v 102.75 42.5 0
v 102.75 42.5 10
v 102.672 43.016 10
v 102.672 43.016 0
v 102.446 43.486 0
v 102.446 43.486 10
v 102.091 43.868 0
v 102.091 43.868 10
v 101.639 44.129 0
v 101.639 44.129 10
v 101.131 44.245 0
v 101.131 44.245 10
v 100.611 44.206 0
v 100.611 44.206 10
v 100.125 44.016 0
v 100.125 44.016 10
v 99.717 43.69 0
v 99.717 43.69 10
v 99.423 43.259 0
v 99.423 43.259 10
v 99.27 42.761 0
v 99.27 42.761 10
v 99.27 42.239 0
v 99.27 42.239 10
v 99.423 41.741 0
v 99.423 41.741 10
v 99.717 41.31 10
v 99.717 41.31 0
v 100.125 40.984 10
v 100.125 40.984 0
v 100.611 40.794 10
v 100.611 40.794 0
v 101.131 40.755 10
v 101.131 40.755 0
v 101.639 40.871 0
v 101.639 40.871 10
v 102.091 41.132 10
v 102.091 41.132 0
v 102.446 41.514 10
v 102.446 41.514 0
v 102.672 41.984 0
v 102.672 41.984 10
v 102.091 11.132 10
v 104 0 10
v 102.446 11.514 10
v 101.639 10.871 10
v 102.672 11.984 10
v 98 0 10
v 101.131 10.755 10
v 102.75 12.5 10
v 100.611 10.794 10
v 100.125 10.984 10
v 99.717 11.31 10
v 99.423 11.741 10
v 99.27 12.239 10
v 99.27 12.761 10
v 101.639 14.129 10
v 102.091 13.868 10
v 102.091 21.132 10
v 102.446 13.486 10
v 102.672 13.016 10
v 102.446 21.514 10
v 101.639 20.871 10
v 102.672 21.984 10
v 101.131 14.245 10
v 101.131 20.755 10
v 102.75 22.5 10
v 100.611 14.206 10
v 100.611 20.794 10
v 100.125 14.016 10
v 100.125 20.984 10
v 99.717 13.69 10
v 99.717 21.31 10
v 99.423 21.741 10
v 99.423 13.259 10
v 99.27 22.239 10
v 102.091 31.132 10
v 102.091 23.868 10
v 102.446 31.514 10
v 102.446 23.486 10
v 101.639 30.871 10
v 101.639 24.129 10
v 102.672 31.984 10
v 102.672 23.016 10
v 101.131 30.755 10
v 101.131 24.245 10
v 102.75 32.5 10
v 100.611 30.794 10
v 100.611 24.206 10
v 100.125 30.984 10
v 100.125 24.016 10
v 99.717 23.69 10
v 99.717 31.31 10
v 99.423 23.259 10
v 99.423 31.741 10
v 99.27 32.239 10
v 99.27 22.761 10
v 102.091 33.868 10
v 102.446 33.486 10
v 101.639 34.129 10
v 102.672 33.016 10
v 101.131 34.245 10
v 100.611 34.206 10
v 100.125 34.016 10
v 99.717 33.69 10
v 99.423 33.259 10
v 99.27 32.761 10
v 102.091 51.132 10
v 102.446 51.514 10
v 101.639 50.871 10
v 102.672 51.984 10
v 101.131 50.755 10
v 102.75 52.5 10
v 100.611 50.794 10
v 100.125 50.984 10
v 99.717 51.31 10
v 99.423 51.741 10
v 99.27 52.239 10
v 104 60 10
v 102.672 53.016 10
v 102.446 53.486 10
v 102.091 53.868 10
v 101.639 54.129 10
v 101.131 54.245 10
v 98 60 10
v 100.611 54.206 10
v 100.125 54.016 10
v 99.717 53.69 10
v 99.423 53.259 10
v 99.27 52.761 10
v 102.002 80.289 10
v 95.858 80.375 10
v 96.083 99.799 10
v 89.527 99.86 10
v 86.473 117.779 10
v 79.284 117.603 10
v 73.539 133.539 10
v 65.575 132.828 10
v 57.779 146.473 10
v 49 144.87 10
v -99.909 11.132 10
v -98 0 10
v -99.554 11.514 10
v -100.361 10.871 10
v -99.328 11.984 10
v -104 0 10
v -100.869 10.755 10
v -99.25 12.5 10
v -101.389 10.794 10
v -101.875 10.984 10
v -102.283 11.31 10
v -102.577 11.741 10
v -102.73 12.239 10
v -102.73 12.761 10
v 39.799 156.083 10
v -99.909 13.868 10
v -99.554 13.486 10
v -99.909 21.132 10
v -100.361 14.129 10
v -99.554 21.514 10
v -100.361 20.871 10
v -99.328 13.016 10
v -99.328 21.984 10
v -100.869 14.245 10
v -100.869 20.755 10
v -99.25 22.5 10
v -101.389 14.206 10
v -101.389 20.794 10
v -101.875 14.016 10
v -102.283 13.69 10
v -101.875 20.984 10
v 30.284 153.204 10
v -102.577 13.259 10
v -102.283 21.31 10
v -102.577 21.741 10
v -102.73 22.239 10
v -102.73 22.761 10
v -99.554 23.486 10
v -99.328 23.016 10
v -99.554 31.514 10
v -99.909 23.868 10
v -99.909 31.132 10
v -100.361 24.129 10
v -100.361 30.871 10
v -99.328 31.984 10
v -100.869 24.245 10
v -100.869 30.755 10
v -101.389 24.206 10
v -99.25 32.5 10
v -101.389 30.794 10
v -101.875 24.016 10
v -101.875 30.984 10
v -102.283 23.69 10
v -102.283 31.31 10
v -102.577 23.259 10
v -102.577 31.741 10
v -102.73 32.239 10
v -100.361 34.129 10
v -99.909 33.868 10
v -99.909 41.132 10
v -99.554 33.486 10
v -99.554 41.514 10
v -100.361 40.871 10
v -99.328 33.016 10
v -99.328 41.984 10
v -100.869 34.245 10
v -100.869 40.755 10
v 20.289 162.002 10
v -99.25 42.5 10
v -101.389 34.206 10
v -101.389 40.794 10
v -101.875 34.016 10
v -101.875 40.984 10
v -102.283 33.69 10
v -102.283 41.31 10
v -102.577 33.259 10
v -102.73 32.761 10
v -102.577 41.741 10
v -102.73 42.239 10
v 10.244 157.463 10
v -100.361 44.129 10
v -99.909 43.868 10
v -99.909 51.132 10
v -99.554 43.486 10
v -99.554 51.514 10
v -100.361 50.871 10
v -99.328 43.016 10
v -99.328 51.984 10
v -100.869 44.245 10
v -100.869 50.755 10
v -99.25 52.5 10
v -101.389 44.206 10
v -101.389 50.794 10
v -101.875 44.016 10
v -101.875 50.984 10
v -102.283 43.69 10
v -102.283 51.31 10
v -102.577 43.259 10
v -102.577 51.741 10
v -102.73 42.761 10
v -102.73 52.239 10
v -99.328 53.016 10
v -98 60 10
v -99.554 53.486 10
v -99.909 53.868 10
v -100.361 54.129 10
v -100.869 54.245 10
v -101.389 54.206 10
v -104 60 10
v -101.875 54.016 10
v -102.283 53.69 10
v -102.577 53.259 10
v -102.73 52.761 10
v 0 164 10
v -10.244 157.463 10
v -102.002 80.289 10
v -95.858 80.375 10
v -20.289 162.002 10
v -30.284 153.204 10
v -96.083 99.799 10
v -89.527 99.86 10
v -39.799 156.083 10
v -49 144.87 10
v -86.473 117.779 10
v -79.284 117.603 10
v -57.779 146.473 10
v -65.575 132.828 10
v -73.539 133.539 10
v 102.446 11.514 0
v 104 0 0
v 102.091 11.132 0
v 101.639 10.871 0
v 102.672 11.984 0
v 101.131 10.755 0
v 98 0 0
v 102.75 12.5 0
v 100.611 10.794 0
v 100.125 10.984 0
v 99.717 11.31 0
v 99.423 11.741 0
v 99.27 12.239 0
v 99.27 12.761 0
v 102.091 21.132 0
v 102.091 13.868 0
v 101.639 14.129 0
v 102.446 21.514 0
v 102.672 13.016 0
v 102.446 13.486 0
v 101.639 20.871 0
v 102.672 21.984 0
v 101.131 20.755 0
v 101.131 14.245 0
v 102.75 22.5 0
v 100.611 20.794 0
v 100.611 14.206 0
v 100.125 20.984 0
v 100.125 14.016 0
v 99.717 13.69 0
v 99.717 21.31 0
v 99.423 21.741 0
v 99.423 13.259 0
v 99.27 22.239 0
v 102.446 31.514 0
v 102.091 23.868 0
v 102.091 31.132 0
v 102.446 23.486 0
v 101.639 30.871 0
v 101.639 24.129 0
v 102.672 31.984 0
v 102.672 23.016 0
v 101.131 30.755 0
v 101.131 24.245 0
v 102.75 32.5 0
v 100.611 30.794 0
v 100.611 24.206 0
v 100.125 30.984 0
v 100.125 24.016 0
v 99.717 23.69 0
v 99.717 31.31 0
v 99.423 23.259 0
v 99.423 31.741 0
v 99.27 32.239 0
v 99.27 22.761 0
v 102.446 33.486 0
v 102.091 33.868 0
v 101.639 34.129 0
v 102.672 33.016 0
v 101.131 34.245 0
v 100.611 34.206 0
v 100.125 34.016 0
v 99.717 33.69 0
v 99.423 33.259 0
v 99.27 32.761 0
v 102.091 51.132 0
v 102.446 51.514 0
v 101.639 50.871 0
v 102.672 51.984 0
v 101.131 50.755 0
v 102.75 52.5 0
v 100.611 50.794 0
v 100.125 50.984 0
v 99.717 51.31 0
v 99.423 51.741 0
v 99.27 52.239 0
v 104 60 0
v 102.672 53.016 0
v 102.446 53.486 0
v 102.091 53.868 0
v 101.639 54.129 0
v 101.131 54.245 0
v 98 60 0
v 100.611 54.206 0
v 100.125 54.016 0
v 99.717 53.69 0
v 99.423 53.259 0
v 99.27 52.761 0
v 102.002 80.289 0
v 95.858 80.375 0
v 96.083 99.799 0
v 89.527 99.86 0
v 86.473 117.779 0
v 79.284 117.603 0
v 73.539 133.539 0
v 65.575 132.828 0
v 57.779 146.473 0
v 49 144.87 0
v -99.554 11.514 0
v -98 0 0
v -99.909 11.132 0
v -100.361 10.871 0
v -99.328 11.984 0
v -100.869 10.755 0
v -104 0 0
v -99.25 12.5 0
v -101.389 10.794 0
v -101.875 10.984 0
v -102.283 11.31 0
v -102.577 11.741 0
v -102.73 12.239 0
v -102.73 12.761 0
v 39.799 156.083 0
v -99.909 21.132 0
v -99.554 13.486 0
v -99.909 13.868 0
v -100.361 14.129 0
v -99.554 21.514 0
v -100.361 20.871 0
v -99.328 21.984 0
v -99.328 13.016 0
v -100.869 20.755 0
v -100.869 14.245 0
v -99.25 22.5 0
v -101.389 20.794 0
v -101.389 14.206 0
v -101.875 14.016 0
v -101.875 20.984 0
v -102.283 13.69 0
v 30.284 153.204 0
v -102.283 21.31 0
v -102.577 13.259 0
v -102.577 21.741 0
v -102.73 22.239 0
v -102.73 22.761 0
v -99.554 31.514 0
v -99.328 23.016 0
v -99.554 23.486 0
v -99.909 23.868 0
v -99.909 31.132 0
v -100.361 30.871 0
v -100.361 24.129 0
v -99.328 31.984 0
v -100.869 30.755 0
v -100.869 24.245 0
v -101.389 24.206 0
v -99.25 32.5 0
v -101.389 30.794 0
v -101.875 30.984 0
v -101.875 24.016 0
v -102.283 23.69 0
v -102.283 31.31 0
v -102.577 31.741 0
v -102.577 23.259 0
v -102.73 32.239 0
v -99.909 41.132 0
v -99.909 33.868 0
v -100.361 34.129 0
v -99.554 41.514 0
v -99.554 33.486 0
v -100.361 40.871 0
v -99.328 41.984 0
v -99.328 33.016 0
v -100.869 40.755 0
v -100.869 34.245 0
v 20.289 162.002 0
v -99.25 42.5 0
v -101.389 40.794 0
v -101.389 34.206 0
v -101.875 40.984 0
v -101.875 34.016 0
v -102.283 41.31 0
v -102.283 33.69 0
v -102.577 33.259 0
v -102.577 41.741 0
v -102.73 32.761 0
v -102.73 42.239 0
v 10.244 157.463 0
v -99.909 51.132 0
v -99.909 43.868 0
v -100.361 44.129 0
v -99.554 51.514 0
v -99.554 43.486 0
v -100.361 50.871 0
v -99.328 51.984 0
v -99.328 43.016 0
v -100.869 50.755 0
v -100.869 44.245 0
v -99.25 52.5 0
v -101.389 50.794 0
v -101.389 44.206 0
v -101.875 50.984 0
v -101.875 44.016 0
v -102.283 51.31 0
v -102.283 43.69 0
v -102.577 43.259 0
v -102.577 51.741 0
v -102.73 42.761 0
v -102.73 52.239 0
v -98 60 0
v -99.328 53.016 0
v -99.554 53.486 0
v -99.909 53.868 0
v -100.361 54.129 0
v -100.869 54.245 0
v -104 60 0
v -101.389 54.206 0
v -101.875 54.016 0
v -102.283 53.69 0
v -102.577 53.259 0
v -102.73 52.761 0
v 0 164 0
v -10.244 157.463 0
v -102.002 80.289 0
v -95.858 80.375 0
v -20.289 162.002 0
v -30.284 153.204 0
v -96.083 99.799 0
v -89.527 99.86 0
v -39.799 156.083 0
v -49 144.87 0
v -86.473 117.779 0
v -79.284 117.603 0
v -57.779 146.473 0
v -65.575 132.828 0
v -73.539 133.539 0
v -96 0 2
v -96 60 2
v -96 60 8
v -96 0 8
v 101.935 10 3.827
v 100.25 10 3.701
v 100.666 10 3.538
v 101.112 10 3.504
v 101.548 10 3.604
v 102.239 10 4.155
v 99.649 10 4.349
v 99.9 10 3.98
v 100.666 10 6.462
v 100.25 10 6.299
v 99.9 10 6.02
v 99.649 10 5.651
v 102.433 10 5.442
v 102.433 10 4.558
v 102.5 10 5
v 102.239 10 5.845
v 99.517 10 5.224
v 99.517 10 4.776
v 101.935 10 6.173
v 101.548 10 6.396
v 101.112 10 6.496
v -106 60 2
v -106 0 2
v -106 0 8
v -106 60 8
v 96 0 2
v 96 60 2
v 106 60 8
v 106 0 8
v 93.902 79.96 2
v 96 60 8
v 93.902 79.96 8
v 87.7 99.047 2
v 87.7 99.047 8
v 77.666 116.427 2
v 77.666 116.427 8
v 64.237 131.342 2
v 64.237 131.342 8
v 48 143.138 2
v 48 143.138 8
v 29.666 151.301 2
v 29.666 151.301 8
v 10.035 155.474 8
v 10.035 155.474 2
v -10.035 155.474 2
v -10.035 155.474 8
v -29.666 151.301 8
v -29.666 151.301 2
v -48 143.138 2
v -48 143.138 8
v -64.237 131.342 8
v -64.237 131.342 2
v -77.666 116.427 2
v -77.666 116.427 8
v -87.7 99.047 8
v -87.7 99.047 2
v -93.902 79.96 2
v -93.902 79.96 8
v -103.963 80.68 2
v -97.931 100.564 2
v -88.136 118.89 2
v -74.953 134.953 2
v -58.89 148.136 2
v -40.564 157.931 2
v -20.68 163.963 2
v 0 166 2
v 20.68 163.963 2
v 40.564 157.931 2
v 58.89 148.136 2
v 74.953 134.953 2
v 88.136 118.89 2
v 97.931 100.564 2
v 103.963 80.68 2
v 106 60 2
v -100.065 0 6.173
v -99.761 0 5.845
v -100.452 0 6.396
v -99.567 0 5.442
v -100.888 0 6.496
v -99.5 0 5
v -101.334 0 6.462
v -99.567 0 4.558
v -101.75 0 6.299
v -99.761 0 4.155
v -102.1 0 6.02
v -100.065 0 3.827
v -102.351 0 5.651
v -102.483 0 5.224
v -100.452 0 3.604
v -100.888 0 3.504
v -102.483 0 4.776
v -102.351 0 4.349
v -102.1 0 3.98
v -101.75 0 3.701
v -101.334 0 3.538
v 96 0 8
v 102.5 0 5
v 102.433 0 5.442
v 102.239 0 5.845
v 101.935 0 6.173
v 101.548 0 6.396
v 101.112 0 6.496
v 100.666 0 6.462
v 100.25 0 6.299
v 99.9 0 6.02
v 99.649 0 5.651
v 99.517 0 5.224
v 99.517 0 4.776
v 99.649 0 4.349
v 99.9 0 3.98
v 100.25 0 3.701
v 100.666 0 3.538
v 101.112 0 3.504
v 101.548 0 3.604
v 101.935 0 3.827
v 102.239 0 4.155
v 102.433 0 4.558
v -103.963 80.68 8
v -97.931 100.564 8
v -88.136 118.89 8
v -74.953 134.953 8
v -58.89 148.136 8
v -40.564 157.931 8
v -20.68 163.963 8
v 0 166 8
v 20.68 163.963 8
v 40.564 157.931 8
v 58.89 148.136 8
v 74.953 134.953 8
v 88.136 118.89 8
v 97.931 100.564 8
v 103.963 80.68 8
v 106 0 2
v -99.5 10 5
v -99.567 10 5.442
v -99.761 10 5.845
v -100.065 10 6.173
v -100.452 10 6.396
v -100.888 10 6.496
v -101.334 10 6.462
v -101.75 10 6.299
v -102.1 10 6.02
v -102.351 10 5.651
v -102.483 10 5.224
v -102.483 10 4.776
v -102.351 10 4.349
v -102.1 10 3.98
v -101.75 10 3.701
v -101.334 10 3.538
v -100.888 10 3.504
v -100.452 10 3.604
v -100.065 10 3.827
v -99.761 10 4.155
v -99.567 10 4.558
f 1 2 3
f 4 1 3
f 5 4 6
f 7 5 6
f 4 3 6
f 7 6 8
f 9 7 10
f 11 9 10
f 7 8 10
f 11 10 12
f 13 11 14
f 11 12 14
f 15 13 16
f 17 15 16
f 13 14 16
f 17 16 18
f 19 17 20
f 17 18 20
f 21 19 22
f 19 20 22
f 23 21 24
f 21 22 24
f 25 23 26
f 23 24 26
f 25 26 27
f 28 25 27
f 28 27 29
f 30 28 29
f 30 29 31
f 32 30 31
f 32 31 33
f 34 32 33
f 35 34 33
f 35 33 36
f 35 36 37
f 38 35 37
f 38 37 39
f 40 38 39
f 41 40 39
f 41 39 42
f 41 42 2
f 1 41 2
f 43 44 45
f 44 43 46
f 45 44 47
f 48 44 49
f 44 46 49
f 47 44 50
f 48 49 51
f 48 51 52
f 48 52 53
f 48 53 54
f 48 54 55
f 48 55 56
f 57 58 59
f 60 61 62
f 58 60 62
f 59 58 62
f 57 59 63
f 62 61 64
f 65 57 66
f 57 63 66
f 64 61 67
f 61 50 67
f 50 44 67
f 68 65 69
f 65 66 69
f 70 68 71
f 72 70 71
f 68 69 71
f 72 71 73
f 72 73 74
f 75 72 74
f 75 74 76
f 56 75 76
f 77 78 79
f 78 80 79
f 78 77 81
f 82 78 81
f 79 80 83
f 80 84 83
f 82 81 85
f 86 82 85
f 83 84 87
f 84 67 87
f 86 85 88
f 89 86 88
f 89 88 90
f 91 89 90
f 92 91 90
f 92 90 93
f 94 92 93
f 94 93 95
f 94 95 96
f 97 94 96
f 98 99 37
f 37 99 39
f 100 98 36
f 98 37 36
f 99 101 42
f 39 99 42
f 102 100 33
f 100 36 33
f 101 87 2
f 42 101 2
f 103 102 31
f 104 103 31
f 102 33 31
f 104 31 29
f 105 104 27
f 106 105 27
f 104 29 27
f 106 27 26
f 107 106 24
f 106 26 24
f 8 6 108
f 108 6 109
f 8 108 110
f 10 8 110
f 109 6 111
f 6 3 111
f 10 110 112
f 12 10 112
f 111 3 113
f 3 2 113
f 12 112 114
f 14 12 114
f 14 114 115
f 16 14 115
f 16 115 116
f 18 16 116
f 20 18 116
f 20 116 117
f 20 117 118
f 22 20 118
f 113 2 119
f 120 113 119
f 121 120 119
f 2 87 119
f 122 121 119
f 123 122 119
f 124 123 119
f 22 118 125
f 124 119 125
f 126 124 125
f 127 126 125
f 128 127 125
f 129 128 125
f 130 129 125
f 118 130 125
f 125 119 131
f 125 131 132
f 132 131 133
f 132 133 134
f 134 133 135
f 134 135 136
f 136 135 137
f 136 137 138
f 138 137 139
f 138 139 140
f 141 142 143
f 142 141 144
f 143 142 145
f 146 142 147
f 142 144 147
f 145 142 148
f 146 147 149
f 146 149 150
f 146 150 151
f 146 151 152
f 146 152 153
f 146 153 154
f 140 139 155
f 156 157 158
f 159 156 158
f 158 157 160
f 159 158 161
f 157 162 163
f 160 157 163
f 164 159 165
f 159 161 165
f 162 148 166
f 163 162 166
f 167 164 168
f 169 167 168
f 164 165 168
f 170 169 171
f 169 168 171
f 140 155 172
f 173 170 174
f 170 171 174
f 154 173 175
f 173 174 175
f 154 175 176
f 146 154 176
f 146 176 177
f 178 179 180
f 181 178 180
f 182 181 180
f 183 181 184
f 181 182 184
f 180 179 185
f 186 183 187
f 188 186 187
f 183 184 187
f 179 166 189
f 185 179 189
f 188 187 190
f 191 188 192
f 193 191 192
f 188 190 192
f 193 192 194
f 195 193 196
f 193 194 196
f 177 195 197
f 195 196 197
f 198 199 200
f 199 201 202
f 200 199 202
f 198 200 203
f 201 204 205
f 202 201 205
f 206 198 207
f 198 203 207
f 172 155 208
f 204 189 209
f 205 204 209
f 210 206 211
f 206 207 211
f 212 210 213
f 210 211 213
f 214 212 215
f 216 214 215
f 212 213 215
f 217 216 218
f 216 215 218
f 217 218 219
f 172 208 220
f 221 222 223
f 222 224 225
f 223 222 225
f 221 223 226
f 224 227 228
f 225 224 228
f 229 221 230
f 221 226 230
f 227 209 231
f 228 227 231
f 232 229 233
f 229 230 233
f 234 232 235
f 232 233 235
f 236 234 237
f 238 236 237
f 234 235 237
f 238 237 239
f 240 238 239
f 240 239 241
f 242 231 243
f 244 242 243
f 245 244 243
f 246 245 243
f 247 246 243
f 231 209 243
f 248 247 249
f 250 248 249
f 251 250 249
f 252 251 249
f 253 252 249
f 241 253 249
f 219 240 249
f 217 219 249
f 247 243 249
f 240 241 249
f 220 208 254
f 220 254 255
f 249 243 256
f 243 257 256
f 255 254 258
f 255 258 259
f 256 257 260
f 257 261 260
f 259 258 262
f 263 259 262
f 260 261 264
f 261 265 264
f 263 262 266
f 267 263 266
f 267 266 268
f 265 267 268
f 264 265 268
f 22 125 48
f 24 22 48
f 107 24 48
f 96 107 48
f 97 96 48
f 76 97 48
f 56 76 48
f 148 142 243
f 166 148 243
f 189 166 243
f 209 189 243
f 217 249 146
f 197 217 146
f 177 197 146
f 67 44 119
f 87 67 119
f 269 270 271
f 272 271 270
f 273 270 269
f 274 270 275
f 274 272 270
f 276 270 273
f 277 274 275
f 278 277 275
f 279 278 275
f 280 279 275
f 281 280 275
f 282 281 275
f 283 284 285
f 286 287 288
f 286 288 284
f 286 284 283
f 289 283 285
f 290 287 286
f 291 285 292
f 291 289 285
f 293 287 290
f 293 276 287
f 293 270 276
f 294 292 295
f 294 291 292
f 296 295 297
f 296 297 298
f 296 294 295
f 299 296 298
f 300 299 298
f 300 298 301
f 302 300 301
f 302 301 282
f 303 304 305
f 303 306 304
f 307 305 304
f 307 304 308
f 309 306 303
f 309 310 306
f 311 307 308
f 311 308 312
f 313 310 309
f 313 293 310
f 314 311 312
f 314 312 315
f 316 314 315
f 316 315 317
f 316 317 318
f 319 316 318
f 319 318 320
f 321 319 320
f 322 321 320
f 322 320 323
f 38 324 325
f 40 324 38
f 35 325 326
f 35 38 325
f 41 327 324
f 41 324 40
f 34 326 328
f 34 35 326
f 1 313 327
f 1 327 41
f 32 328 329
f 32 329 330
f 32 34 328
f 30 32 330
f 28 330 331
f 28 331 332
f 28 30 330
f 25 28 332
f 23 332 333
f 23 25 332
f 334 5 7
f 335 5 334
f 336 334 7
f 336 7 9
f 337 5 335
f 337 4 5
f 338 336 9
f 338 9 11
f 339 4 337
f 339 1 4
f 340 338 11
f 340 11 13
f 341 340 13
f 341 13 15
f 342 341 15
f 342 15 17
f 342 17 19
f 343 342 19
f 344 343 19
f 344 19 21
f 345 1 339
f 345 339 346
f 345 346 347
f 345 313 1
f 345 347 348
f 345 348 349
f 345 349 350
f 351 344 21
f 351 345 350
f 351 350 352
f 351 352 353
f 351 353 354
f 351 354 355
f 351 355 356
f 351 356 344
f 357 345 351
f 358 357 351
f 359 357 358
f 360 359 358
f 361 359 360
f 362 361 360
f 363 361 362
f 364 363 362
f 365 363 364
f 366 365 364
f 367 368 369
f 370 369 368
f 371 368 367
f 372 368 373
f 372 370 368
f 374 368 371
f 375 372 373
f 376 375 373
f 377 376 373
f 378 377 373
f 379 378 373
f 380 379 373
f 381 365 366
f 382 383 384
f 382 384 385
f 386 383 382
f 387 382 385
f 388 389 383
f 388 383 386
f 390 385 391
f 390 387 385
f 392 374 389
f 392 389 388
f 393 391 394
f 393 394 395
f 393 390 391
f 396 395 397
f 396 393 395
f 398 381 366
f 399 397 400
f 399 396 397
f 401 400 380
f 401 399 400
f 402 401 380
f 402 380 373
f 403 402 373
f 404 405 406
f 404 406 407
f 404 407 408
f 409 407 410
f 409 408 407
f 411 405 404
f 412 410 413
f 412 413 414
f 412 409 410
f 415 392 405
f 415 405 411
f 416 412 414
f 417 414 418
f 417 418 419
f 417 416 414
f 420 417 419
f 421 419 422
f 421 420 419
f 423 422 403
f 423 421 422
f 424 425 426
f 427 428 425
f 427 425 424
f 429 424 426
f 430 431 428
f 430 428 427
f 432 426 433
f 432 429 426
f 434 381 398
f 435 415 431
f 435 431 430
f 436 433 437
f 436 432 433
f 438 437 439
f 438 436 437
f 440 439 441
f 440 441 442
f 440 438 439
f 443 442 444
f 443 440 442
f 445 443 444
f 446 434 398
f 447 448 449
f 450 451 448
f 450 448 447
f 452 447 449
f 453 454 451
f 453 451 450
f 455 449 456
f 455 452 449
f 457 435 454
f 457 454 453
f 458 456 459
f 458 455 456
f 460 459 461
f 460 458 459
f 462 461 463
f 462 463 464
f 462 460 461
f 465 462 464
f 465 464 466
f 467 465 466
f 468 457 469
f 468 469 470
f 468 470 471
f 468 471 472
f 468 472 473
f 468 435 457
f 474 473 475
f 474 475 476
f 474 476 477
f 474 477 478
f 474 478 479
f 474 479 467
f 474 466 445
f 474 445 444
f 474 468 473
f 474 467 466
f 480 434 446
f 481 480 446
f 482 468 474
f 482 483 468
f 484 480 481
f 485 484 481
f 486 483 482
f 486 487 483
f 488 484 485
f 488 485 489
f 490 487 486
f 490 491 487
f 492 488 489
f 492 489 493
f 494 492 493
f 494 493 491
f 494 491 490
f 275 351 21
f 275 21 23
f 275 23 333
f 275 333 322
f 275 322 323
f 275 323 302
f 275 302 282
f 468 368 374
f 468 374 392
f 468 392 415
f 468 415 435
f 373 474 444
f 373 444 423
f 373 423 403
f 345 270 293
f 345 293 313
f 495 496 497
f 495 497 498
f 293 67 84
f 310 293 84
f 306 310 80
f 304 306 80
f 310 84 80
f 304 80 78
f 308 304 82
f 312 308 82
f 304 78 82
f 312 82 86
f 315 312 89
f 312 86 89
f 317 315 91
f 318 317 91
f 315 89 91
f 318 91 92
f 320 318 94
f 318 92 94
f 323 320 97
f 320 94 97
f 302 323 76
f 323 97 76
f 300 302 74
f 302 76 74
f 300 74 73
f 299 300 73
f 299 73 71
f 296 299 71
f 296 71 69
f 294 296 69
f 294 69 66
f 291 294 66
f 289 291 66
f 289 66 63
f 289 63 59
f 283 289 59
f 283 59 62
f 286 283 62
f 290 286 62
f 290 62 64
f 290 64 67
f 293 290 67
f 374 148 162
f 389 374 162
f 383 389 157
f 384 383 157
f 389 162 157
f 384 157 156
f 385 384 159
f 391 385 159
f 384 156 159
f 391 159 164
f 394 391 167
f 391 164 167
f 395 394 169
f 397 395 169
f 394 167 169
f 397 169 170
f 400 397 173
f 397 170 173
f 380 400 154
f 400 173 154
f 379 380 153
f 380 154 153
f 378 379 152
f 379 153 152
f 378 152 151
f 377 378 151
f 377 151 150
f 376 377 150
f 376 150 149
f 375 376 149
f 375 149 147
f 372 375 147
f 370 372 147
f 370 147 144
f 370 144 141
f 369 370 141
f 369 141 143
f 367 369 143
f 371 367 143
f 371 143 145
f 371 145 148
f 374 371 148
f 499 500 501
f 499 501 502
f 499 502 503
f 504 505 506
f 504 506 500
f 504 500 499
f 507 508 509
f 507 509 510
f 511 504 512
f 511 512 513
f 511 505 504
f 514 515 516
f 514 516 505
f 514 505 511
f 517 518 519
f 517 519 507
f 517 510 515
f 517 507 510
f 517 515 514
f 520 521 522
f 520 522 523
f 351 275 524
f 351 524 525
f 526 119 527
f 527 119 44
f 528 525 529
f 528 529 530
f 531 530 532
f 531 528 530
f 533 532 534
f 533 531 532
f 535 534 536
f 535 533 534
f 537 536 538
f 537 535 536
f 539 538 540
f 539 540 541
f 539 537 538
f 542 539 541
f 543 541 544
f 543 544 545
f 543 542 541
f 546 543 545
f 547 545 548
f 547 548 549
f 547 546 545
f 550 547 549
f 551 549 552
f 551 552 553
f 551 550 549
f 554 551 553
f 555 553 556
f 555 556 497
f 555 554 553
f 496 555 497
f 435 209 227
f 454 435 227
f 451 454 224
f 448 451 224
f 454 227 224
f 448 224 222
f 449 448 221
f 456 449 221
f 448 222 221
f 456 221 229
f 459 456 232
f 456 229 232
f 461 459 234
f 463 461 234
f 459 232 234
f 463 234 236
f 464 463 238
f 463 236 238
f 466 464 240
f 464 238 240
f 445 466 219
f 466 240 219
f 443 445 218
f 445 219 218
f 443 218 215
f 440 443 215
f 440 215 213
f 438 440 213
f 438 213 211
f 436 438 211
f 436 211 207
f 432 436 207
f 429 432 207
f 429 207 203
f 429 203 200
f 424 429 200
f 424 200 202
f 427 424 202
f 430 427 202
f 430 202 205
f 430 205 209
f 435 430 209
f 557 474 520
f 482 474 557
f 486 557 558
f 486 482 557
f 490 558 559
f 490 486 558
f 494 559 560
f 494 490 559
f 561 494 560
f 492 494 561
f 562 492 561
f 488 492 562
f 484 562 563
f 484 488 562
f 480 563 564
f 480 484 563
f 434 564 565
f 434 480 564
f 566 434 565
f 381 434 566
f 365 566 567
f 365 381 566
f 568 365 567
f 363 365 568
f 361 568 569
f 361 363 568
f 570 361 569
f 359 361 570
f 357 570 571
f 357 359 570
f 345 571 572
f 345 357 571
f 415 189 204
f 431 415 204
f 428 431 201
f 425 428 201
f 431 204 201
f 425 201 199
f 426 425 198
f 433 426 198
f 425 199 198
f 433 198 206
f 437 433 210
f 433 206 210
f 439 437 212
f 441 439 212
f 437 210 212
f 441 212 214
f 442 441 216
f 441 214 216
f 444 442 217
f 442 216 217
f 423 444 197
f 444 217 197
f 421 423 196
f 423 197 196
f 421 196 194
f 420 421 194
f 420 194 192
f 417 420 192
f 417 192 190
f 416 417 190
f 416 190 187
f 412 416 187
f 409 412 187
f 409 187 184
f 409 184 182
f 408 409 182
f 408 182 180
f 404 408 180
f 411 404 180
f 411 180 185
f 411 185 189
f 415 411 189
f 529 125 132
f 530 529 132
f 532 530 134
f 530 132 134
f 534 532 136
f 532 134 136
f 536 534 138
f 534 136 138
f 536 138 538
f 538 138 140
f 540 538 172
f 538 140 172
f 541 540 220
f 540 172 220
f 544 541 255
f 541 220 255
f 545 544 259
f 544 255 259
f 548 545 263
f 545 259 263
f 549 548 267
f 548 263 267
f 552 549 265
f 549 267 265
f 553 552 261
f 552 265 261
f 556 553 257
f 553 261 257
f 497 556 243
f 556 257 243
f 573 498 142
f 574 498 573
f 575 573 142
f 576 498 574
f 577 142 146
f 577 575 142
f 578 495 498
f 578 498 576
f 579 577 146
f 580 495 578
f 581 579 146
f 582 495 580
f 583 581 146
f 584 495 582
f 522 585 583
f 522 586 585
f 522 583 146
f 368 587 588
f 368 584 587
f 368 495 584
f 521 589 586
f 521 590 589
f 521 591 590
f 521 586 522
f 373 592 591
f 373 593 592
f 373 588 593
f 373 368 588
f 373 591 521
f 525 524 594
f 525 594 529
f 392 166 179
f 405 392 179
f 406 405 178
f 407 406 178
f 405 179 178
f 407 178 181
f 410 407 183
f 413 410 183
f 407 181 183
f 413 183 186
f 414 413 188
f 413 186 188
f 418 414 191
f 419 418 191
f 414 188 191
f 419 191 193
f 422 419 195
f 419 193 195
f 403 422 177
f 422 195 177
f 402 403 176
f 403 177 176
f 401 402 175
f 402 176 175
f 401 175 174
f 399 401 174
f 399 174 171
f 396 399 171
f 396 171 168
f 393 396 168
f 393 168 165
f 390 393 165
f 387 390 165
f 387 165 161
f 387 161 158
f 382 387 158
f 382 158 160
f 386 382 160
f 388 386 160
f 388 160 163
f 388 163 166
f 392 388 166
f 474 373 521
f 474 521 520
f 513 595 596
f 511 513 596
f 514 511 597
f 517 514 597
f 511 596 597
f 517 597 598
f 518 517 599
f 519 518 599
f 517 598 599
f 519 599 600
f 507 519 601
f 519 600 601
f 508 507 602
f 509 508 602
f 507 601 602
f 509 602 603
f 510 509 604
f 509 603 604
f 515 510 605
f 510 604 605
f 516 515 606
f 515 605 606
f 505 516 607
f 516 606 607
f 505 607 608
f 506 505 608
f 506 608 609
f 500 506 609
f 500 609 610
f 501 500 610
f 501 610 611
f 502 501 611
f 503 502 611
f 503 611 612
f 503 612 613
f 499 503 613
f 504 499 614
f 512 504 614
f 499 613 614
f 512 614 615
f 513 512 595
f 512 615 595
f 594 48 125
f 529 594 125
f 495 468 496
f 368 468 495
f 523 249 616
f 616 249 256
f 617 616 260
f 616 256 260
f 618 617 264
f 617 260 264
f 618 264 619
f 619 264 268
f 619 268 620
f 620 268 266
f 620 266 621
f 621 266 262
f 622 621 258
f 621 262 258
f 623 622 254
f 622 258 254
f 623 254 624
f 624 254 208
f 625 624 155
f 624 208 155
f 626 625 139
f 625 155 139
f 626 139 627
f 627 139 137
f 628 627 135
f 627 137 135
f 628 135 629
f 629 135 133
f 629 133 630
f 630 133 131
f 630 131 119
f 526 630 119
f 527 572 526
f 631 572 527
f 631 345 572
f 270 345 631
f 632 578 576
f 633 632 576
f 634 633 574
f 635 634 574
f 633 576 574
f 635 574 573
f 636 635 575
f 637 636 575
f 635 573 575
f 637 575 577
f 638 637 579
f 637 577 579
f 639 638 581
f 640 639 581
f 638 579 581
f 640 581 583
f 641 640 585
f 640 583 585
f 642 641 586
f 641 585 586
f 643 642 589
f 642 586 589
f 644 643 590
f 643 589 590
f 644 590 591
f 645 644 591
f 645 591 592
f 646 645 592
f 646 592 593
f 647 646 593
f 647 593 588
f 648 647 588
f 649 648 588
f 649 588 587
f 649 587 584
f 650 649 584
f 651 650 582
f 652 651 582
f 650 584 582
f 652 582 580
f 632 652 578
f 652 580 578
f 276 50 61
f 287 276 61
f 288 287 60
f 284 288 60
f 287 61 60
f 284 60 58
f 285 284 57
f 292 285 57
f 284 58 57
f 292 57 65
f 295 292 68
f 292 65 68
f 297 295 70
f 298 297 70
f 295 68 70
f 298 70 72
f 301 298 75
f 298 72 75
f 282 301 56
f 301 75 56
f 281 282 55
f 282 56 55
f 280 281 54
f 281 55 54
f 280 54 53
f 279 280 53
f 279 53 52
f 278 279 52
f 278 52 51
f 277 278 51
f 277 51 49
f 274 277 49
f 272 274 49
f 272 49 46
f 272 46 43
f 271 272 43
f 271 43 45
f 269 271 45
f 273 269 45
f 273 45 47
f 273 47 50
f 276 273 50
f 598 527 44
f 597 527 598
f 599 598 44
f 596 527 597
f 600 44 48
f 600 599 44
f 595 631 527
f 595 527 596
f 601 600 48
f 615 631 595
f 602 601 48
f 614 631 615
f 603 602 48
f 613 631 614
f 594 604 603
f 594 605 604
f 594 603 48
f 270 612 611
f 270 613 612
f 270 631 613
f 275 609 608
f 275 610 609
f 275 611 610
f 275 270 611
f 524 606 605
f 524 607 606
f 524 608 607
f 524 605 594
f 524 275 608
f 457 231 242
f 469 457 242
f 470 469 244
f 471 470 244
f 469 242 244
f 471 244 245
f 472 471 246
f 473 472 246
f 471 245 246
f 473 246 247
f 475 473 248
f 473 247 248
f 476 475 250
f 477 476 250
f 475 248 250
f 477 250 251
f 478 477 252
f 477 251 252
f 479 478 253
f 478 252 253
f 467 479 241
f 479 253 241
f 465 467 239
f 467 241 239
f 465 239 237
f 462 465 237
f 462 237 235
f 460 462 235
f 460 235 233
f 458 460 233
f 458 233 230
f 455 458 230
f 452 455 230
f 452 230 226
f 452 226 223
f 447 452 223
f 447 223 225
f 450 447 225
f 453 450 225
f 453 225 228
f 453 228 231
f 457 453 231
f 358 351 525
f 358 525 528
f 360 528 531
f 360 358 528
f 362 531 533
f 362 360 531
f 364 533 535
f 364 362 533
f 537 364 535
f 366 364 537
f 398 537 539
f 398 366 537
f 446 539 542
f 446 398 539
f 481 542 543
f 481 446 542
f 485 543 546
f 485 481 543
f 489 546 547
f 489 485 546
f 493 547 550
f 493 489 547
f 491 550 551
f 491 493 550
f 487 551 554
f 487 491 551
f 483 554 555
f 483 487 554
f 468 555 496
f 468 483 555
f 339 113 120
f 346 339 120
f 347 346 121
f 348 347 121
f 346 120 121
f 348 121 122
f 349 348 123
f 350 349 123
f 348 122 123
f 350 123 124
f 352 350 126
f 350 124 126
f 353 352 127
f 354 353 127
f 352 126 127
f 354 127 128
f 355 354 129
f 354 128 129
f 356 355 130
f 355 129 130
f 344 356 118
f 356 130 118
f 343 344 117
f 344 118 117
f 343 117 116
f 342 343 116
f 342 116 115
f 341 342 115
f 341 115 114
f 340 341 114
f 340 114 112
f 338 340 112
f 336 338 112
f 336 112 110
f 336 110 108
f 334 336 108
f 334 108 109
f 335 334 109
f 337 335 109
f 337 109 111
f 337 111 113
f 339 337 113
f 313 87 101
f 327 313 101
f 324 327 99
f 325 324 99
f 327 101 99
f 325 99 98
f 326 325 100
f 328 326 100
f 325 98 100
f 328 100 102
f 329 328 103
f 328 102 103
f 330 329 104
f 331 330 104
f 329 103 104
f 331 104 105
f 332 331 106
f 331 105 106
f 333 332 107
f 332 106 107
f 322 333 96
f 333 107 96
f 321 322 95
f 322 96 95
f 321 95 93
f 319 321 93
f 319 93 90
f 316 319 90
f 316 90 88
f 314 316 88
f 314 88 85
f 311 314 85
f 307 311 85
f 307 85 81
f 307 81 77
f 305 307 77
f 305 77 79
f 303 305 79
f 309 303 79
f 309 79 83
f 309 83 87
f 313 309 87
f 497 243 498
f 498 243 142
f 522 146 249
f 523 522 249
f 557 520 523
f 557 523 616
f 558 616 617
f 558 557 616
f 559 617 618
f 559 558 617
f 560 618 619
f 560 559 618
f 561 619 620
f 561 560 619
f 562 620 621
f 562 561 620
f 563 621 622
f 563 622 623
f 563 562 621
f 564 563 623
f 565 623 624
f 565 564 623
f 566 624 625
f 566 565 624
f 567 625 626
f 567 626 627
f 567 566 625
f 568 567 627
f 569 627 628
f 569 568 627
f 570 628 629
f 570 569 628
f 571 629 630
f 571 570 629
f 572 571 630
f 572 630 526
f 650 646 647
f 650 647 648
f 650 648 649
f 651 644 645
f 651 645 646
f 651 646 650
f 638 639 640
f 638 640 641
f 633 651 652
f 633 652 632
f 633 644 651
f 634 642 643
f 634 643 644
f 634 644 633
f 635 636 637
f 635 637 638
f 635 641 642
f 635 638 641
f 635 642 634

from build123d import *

# Parameters (mm, degrees)
BOSS_EXTRUDE1_DEPTH = 10
CHAMFER1_SIZE       = 2
SKETCH2_R           = 1.75
CUT_EXTRUDE1_DEPTH  = 11
LPATTERN1_COUNT     = 5
LPATTERN1_PITCH     = 10
SKETCH3_R           = 1.5
CUT_EXTRUDE2_DEPTH  = 10


with BuildPart() as part:
    # Sketch1 → Boss-Extrude1 (new body)
    with BuildSketch(Plane.XY):
        with BuildLine():
            Line((-106, 0), (-106, 60))
            ThreePointArc((-106, 60), (0, 166), (106, 60))
            Line((106, 60), (106, 0))
            Line((106, 0), (96, 0))
            Line((96, 0), (96, 60))
            ThreePointArc((96, 60), (0, 156), (-96, 60))
            Line((-96, 60), (-96, 0))
            Line((-96, 0), (-106, 0))
        make_face()
    extrude(amount=BOSS_EXTRUDE1_DEPTH)

    # Chamfer1
    chamfer1_edges = [part.edges().sort_by_distance(p)[0] for p in [
        (96, 30, 0),
        (0, 156, 0),
        (-96, 30, 0),
        (0, 156, 10),
        (96, 30, 10),
        (106, 30, 10),
        (0, 166, 10),
        (-106, 30, 10),
        (-106, 30, 0),
        (-96, 30, 10),
        (0, 166, 0),
        (106, 30, 0),
    ]]
    chamfer(chamfer1_edges, length=CHAMFER1_SIZE)

    # Sketch2 → Cut-Extrude1 (cut, through all)
    with BuildSketch(Plane.XY.offset(10)):
        with Locations((-101, 12.5)):
            Circle(SKETCH2_R)
        with Locations((101, 12.5)):
            Circle(SKETCH2_R)
    cut_extrude1 = extrude(amount=-CUT_EXTRUDE1_DEPTH, mode=Mode.SUBTRACT)

    # LPattern1: Cut-Extrude1 ×5
    with Locations(*[(0, i * LPATTERN1_PITCH, 0) for i in range(1, LPATTERN1_COUNT)]):
        add(cut_extrude1, mode=Mode.SUBTRACT)

    # Sketch3 → Cut-Extrude2 (cut)
    with BuildSketch(Plane.XZ):
        with Locations((-101, 5)):
            Circle(SKETCH3_R)
        with Locations((101, 5)):
            Circle(SKETCH3_R)
    extrude(amount=-CUT_EXTRUDE2_DEPTH, mode=Mode.SUBTRACT)


solid = part.part
